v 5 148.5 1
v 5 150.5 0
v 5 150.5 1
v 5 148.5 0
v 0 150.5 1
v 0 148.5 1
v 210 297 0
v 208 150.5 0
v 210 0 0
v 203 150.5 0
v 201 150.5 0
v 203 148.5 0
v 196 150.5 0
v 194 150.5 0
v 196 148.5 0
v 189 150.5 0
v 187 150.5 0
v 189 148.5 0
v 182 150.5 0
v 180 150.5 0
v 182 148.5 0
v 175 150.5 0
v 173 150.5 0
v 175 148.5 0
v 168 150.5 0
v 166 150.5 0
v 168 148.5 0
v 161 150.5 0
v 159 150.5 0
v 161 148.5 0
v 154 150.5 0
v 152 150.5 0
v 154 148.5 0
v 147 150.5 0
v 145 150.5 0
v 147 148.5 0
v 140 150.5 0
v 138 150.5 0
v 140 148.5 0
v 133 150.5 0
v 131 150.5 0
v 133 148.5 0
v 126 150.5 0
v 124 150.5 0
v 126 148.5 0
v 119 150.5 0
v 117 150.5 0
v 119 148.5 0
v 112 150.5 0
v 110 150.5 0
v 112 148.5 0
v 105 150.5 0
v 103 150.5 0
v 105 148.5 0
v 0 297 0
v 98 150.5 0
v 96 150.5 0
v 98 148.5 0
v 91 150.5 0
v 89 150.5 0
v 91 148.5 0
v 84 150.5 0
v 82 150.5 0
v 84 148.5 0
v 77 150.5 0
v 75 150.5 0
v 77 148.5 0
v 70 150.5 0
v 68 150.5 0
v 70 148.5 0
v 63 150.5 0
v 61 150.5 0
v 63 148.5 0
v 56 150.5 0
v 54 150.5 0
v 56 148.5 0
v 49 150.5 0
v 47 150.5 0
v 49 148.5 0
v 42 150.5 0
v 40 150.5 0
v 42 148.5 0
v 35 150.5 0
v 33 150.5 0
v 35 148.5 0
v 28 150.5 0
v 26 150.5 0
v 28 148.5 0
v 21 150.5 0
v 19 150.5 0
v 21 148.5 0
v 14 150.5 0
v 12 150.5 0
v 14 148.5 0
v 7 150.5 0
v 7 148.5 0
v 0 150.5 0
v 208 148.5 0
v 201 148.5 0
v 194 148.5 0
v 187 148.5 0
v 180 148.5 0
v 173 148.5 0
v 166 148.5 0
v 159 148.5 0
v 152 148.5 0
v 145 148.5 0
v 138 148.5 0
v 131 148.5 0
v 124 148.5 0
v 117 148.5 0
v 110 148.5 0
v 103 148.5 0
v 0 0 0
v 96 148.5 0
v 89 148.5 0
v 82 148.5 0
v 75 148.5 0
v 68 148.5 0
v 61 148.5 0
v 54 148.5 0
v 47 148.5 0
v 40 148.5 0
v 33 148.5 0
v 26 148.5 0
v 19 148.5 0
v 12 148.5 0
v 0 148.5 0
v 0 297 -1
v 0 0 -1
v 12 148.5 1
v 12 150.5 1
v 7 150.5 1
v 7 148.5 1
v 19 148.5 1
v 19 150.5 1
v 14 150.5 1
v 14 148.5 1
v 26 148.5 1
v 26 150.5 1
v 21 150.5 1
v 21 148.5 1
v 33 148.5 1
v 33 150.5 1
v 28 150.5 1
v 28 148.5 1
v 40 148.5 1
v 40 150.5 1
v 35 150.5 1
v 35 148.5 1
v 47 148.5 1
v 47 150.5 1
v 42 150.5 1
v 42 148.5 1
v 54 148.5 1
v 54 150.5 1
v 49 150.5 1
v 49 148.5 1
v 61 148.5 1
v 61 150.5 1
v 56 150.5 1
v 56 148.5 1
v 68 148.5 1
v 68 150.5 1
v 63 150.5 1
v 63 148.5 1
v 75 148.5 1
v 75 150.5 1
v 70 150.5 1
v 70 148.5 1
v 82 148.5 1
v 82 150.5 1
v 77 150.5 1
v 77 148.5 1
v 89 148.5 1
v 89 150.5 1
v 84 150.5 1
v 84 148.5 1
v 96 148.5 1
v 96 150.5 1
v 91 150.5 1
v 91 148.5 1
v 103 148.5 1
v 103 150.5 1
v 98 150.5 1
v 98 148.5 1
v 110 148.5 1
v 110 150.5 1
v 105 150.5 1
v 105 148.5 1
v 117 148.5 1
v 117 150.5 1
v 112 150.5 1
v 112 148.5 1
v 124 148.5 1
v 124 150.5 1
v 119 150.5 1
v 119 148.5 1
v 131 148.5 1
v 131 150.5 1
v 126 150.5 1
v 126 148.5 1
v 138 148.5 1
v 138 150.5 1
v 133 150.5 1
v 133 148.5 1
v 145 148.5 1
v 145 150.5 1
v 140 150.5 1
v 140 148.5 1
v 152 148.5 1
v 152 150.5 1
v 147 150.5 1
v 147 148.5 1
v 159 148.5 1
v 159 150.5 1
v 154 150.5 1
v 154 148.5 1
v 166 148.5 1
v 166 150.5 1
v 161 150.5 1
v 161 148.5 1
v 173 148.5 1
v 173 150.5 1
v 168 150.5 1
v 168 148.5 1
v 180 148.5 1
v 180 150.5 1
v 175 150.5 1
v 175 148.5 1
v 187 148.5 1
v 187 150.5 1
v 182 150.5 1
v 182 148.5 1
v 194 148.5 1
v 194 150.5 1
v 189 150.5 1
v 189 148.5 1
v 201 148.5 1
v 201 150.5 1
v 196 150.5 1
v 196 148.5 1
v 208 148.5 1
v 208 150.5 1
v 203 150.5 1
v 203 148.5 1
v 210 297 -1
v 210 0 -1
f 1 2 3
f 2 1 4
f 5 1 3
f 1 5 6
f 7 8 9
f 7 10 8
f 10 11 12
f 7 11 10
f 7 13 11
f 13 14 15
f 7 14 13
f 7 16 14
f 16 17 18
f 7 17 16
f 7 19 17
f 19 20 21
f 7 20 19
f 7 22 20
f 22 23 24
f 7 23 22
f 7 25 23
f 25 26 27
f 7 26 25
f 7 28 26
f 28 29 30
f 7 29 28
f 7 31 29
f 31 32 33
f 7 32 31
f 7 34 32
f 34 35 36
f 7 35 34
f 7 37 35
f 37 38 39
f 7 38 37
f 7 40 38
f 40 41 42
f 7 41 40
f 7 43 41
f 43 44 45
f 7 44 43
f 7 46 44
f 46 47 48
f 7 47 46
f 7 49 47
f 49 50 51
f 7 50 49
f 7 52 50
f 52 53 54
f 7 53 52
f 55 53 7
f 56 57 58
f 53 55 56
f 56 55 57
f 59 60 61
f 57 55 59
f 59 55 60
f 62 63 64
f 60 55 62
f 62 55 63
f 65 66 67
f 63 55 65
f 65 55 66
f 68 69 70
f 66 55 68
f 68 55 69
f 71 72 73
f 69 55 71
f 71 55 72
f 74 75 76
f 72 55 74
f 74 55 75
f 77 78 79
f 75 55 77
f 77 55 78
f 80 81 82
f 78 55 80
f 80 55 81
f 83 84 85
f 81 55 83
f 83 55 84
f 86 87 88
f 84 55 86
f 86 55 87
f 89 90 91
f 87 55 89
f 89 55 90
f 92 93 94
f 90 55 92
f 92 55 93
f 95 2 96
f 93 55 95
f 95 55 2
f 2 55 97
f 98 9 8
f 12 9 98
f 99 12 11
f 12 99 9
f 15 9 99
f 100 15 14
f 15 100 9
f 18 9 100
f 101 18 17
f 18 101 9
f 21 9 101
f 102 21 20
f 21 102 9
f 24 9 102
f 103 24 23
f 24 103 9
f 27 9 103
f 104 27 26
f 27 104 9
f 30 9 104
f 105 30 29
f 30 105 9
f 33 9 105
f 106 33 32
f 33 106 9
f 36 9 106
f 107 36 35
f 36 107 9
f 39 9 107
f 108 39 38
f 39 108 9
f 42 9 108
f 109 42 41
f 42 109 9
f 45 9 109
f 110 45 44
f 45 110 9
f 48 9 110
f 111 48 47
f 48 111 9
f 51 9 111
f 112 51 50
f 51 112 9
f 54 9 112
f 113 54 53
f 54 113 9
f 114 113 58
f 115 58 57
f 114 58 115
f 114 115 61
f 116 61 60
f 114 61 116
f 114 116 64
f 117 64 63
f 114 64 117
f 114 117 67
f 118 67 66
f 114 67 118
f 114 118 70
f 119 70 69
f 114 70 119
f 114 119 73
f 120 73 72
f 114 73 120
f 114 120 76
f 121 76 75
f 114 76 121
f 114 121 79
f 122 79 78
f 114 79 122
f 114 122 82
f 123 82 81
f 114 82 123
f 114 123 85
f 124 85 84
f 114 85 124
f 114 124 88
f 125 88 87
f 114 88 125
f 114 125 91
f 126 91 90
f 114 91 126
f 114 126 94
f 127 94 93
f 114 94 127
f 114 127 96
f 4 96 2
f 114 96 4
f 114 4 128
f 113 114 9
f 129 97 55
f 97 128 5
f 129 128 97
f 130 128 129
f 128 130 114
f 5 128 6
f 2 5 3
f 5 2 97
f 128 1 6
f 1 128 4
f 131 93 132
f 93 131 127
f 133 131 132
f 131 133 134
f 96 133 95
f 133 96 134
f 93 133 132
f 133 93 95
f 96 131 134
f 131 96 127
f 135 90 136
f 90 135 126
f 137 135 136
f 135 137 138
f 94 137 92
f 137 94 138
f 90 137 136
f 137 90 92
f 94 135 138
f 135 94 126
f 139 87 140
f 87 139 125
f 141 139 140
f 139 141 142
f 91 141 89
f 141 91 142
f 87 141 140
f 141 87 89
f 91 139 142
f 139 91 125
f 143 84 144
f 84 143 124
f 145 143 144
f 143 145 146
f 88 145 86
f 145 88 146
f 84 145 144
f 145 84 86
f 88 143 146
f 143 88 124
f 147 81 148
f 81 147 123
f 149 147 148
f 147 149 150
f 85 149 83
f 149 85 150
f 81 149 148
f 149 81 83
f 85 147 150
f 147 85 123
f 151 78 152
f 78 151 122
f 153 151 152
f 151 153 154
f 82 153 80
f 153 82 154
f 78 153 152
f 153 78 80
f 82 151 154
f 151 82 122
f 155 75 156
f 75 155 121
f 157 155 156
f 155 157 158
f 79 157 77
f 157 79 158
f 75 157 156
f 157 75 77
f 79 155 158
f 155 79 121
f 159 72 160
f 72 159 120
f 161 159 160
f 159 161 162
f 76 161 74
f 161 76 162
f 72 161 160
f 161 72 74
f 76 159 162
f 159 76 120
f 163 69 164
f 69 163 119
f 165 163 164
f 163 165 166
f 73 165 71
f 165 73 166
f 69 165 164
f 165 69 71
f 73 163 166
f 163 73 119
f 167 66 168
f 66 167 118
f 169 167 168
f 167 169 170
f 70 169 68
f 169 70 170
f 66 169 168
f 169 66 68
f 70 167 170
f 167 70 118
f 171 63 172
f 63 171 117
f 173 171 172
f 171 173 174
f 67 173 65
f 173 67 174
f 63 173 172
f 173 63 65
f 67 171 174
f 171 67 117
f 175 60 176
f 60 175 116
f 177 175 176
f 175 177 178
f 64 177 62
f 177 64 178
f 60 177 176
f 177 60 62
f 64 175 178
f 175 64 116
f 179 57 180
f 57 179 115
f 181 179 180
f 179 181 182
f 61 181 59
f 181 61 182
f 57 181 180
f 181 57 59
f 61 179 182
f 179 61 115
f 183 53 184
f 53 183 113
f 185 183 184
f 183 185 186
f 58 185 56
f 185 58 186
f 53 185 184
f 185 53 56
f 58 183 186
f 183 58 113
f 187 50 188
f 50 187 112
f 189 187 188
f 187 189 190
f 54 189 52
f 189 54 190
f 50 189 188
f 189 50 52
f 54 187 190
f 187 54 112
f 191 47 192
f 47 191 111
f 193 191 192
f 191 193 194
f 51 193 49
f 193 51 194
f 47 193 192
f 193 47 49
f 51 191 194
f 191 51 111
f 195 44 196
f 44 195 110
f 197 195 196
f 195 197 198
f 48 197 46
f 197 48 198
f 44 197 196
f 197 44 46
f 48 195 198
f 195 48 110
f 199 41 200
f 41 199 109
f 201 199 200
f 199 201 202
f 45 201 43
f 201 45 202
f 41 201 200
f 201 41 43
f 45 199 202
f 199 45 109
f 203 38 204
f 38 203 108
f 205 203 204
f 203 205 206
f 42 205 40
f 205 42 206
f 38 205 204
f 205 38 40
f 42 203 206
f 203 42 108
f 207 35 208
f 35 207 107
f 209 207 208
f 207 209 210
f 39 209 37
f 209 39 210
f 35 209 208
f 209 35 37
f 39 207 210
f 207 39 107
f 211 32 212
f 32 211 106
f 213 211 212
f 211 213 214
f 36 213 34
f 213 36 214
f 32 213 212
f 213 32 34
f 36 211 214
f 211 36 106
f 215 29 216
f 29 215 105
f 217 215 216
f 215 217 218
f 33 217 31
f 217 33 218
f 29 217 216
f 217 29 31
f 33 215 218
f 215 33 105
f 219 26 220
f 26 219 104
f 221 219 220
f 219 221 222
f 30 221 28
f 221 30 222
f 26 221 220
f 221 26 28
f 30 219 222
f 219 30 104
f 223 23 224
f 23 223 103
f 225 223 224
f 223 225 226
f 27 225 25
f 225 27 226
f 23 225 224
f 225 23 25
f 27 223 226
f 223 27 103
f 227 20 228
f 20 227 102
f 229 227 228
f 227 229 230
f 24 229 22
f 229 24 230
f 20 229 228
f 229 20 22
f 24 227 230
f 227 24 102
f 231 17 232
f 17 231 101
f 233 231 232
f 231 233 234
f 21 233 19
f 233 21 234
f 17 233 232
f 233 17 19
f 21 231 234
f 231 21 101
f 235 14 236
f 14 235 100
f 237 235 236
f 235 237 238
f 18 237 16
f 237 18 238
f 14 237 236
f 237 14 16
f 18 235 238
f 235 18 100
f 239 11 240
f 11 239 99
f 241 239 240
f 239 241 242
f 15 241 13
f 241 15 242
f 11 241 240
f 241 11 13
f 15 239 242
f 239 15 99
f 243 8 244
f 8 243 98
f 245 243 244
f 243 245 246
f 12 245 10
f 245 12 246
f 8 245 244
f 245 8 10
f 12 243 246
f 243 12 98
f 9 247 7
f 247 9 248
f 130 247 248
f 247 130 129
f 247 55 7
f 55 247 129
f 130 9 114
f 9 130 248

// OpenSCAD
text = "TEST";
font = "Liberation Serif:style=Bold";
size = 50;

material_x = 210;
material_y = 297;

ligament_width = 5;
ligament_height = 2;
ligament_spacing = 2;
ligament_count = (material_x - ligament_width) / (ligament_width + ligament_spacing);

// paper outline
color("red")
translate([
    0,
    0,
    -1
    ])
cube([
    material_x,
    material_y,
    1
    ]);

// text body
color("green")
translate([
    material_x/2,
    material_y/2,
    0
    ])
text(
    text,
    size = size,
    font = font,
    valign = "top",
    halign = "center"
);

// middle folding ligaments
for (i = [0:ligament_count])
{
    translate([
        i * (ligament_width+ligament_spacing),
        material_y / 2,
        0
        ])
    cube([
        ligament_width,
        ligament_height,
        1
        ]);
}
